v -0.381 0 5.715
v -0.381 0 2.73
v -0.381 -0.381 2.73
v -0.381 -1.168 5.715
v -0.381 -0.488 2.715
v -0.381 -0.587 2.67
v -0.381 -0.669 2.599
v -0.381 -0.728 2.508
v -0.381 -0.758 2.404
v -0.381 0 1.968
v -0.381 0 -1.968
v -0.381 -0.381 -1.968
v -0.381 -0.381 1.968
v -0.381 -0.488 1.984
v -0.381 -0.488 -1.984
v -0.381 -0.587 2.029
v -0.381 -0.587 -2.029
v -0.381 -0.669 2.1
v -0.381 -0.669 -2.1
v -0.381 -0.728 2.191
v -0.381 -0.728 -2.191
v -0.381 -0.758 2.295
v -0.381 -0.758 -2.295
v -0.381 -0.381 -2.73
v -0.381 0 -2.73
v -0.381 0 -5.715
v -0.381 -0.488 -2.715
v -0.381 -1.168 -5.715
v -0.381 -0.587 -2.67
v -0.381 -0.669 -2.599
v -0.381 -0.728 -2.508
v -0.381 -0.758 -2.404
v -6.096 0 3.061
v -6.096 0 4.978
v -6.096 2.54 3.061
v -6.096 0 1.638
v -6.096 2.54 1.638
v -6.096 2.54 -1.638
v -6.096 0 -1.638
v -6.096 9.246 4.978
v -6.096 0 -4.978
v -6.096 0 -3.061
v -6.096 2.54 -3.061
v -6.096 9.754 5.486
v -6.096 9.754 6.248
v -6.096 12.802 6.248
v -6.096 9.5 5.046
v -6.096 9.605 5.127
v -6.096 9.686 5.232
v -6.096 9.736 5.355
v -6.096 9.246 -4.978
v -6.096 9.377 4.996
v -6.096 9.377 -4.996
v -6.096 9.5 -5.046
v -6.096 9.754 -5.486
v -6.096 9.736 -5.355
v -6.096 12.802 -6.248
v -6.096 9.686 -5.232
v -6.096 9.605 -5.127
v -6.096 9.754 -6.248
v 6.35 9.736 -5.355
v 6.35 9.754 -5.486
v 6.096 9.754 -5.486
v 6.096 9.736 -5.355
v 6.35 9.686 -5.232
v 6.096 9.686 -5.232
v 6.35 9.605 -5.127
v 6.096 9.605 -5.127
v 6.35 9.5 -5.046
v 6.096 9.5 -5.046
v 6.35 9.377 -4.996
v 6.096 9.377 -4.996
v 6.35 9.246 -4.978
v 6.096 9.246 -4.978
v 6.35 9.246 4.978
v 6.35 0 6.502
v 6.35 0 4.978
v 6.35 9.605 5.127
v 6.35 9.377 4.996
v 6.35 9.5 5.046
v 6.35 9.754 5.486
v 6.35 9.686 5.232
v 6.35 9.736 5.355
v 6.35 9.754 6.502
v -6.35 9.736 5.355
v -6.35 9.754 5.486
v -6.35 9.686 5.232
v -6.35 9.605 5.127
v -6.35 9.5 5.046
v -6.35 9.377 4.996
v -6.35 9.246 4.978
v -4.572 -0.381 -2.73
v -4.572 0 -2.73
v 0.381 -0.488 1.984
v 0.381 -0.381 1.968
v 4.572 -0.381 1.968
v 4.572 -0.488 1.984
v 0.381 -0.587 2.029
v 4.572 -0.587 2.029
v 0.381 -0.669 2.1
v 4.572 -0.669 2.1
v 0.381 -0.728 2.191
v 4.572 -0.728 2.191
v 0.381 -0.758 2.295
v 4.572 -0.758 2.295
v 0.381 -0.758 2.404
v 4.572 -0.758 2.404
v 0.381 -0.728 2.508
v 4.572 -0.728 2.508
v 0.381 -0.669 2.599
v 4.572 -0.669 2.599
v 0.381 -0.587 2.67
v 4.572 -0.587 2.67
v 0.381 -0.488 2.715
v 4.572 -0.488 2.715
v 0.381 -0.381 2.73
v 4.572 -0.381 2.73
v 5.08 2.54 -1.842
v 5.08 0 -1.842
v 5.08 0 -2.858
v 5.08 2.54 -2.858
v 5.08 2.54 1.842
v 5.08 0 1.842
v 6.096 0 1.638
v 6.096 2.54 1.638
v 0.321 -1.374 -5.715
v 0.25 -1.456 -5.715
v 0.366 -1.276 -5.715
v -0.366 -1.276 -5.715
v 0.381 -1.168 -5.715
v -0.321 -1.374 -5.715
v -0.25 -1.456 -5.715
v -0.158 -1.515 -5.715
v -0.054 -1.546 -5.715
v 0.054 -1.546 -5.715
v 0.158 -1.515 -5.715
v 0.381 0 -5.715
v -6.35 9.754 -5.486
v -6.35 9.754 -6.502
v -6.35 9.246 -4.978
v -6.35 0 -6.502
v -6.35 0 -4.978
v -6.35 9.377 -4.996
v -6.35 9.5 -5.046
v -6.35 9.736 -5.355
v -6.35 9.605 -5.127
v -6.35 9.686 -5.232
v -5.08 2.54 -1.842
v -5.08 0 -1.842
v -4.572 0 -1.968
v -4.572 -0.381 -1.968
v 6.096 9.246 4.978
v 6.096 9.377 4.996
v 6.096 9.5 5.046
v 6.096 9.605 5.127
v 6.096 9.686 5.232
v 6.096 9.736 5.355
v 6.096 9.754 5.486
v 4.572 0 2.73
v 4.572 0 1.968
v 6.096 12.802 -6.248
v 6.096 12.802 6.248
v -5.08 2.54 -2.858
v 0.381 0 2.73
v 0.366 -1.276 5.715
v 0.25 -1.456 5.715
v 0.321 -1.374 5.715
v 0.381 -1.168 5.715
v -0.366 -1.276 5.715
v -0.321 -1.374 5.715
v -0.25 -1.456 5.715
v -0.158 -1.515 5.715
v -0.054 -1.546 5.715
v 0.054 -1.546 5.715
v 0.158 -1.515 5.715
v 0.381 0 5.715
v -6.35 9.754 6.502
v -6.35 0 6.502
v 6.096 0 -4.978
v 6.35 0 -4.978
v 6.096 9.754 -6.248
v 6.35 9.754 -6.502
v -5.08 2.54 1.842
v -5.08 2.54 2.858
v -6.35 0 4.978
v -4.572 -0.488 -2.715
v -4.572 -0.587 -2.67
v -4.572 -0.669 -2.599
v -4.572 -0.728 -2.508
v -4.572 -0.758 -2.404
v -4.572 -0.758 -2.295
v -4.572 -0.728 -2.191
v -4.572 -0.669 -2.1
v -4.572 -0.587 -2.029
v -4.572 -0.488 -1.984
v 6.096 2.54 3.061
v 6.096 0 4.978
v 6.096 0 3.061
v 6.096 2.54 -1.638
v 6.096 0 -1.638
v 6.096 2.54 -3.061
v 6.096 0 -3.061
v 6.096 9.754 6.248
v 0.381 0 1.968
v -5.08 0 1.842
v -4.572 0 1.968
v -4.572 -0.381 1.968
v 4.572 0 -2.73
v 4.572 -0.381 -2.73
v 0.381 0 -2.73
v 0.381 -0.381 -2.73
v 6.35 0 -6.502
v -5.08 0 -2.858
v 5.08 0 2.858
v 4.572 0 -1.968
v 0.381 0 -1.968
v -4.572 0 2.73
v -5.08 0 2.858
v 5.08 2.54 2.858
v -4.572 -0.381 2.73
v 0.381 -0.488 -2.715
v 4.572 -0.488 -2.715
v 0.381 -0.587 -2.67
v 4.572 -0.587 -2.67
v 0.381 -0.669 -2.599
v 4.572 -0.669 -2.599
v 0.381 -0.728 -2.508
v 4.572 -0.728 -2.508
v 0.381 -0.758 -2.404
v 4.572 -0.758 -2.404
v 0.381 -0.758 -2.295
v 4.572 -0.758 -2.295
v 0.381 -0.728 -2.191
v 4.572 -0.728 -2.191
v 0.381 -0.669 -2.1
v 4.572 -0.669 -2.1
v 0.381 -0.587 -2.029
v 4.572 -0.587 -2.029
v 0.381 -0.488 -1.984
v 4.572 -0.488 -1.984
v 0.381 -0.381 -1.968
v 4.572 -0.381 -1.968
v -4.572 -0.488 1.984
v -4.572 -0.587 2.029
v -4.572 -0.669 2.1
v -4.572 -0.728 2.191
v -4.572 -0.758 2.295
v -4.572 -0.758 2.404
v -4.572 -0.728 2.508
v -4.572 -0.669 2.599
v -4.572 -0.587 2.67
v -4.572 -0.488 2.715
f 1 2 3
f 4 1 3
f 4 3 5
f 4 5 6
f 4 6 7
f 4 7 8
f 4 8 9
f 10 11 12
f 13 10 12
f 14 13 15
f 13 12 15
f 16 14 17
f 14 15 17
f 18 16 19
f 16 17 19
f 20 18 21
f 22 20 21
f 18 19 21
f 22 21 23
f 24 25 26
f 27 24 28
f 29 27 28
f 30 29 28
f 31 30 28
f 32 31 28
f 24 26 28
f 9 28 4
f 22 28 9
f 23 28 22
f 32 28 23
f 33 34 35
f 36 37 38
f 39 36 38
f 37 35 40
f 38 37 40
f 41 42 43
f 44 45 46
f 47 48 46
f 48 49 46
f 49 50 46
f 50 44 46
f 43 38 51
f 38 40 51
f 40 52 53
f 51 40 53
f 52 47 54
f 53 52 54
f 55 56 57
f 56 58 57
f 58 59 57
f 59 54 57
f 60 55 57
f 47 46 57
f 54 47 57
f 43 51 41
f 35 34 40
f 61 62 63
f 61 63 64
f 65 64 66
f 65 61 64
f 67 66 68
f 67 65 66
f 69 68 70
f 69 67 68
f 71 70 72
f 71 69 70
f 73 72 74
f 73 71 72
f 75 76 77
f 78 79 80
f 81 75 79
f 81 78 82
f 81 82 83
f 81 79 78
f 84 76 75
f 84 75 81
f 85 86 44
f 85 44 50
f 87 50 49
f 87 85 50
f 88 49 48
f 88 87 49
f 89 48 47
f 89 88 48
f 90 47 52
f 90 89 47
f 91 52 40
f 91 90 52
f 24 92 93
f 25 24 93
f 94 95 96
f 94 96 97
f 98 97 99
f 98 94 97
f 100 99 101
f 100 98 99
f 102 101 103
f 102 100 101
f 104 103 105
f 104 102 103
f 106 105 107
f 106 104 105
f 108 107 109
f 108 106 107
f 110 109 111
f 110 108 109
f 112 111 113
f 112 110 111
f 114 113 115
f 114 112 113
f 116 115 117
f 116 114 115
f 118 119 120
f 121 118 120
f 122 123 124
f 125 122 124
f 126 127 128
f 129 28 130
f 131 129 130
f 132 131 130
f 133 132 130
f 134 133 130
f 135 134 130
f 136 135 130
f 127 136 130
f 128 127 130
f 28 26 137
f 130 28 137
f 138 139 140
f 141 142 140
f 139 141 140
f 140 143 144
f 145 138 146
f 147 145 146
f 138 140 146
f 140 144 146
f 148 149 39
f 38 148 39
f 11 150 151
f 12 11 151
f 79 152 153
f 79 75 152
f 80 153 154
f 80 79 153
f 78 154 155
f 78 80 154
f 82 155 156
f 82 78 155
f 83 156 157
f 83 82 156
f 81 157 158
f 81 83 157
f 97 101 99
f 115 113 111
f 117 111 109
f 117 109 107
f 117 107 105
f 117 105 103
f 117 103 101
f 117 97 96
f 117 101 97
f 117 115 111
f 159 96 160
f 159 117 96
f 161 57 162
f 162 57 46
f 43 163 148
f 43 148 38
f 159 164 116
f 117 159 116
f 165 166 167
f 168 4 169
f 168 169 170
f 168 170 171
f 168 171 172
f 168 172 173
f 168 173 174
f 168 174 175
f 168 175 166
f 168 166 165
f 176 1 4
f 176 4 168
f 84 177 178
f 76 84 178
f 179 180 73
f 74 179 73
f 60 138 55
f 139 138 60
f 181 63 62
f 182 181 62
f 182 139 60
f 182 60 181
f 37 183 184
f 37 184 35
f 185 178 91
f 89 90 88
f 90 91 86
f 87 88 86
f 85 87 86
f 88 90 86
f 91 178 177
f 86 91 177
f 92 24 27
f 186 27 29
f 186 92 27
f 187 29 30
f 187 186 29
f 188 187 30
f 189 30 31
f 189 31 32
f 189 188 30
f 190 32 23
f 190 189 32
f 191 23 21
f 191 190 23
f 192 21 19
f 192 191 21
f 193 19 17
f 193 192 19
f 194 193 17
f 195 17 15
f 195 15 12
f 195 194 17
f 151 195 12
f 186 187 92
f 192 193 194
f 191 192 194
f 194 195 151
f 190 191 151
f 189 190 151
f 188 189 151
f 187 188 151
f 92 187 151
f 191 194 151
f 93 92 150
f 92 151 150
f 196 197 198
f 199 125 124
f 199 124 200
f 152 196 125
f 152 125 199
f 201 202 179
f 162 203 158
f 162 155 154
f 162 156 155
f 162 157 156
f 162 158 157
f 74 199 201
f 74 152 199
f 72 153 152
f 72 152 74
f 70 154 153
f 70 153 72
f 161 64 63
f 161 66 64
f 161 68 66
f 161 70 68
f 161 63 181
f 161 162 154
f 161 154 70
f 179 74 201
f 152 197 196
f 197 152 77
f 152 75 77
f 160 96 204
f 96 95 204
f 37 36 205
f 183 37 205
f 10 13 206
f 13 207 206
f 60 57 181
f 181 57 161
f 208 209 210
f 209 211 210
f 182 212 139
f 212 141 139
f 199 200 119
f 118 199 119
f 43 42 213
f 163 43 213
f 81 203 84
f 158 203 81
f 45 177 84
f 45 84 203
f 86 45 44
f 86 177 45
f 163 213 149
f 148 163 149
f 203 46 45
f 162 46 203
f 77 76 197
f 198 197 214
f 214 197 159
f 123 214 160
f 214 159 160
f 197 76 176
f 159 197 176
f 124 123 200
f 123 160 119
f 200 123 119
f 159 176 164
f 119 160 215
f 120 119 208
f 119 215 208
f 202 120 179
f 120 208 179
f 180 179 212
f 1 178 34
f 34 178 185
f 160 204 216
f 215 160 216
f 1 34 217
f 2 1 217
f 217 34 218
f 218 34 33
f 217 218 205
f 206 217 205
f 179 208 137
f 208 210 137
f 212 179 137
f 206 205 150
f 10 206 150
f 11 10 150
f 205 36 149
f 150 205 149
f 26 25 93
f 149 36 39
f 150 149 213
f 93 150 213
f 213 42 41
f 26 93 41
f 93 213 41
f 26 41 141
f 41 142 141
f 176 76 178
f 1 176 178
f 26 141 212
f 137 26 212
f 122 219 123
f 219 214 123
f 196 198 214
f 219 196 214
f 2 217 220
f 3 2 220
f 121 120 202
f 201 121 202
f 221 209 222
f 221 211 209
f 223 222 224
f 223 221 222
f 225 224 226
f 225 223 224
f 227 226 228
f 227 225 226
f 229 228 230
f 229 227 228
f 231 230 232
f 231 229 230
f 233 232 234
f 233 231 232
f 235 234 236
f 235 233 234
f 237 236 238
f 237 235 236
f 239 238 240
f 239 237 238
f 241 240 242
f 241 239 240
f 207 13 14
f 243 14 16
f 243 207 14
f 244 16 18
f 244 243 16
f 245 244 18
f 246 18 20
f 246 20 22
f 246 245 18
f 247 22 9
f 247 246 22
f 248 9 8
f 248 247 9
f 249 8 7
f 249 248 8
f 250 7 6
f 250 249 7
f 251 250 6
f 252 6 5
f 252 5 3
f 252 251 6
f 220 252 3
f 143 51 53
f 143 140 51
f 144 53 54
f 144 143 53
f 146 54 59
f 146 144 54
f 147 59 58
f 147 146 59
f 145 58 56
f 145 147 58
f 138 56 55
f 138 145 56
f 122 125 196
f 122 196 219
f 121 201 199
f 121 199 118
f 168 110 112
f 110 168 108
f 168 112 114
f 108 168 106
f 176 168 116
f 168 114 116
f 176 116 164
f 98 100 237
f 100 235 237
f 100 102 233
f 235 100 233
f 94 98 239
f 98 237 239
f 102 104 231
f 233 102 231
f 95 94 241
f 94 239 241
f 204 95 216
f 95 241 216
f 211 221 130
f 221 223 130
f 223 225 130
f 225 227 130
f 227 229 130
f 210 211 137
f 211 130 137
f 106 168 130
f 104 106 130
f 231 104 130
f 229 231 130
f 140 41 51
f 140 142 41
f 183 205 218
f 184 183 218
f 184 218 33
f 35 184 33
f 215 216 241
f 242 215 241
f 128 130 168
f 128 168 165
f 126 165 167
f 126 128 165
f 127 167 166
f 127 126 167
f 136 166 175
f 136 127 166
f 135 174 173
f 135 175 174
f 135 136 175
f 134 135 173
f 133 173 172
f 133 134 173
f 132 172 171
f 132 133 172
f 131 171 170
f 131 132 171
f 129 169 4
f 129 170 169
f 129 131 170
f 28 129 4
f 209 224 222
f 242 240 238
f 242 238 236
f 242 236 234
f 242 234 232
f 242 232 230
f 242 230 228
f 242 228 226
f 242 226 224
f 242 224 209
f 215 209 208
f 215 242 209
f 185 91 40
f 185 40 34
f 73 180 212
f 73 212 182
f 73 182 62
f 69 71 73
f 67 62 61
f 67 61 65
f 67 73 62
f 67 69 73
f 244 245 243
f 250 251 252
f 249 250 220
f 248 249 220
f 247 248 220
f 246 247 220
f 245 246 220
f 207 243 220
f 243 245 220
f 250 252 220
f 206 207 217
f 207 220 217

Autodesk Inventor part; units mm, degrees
sketch "Sketch_1" plane through (0, 0, 0) normal (1, 0, 0) x (0, 1, 0)
  line L0 (12.8016, 6.5024) -> (0, 6.5024)
  line L1 (0, 6.5024) -> (0, -6.5024)
  line L2 (0, -6.5024) -> (12.8016, -6.5024)
  line L3 (12.8016, -6.5024) -> (12.8016, 6.5024)
extrude "Extrusion1" add sketch "Sketch_1" along normal mid plane 12.7
sketch "Sketch_5" plane through (6.35, 0, 0) normal (1, 0, 0) x (0, 0, -1)
  line L0 (-6.5024, 9.7536) -> (-5.4864, 9.7536)
  arc A0 (-4.9784, 9.2456) -> (-5.4864, 9.7536) centre (-5.4864, 9.2456) ccw
  line L1 (-4.9784, 9.2456) -> (-4.9784, 0)
  line L2 (-4.9784, 0) -> (4.9784, 0)
  line L3 (4.9784, 0) -> (4.9784, 9.2456)
  arc A1 (5.4864, 9.7536) -> (4.9784, 9.2456) centre (5.4864, 9.2456) ccw
  line L4 (5.4864, 9.7536) -> (6.5024, 9.7536)
  line L5 (6.5024, 9.7536) -> (6.5024, 13.0556)
  line L6 (6.5024, 13.0556) -> (-6.5024, 13.0556)
  line L7 (-6.5024, 13.0556) -> (-6.5024, 9.7536)
extrude "Extrusion2" cut sketch "Sketch_5" against normal blind 0.254
sketch "Sketch_6" plane through (-6.35, 0, 0) normal (1, 0, 0) x (0, 0, -1)
  line L0 (-6.5024, 9.7536) -> (-5.4864, 9.7536)
  arc A0 (-4.9784, 9.2456) -> (-5.4864, 9.7536) centre (-5.4864, 9.2456) ccw
  line L1 (-4.9784, 9.2456) -> (-4.9784, 0)
  line L2 (-4.9784, 0) -> (4.9784, 0)
  line L3 (4.9784, 0) -> (4.9784, 9.2456)
  arc A1 (5.4864, 9.7536) -> (4.9784, 9.2456) centre (5.4864, 9.2456) ccw
  line L4 (5.4864, 9.7536) -> (6.5024, 9.7536)
  line L5 (6.5024, 9.7536) -> (6.5024, 13.0556)
  line L6 (6.5024, 13.0556) -> (-6.5024, 13.0556)
  line L7 (-6.5024, 13.0556) -> (-6.5024, 9.7536)
extrude "Extrusion3" cut sketch "Sketch_6" along normal blind 0.254
sketch "Sketch_7" plane through (0, 0, -6.5024) normal (0, 0, 1) x (1, 0, 0)
  line L0 (-6.35, 9.7536) -> (6.35, 9.7536)
  line L1 (6.35, 9.7536) -> (6.35, 13.0556)
  line L2 (6.35, 13.0556) -> (-6.35, 13.0556)
  line L3 (-6.35, 13.0556) -> (-6.35, 9.7536)
extrude "Extrusion4" cut sketch "Sketch_7" along normal blind 0.254
sketch "Sketch_8" plane through (0, 0, 6.5024) normal (0, 0, 1) x (1, 0, 0)
  line L0 (-6.35, 9.7536) -> (6.35, 9.7536)
  line L1 (6.35, 9.7536) -> (6.35, 13.0556)
  line L2 (6.35, 13.0556) -> (-6.35, 13.0556)
  line L3 (-6.35, 13.0556) -> (-6.35, 9.7536)
extrude "Extrusion5" cut sketch "Sketch_8" against normal blind 0.254
sketch "Sketch_9" plane through (0, 0, 0) normal (0, 1, 0) x (-1, 0, 0)
  line L0 (8.128, 8.2804) -> (-8.128, 8.2804)
  line L1 (-8.128, 8.2804) -> (-8.128, -8.2804)
  line L2 (-8.128, -8.2804) -> (8.128, -8.2804)
  line L3 (8.128, -8.2804) -> (8.128, 8.2804)
  line L4 (6.35, -1.5875) -> (6.35, 1.5875)
  line L5 (6.35, 1.5875) -> (5.08, 1.8415)
  line L6 (5.08, 1.8415) -> (5.08, 2.8575)
  line L7 (5.08, 2.8575) -> (6.35, 3.1115)
  line L8 (6.35, 3.1115) -> (6.35, 6.5024)
  line L9 (6.35, 6.5024) -> (-6.35, 6.5024)
  line L10 (-6.35, 6.5024) -> (-6.35, 3.1115)
  line L11 (-6.35, 3.1115) -> (-5.08, 2.8575)
  line L12 (-5.08, 2.8575) -> (-5.08, 1.8415)
  line L13 (-5.08, 1.8415) -> (-6.35, 1.5875)
  line L14 (-6.35, 1.5875) -> (-6.35, -1.5875)
  line L15 (-6.35, -1.5875) -> (-5.08, -1.8415)
  line L16 (-5.08, -1.8415) -> (-5.08, -2.8575)
  line L17 (-5.08, -2.8575) -> (-6.35, -3.1115)
  line L18 (-6.35, -3.1115) -> (-6.35, -6.5024)
  line L19 (-6.35, -6.5024) -> (6.35, -6.5024)
  line L20 (6.35, -6.5024) -> (6.35, -3.1115)
  line L21 (6.35, -3.1115) -> (5.08, -2.8575)
  line L22 (5.08, -2.8575) -> (5.08, -1.8415)
  line L23 (5.08, -1.8415) -> (6.35, -1.5875)
extrude "Extrusion6" cut sketch "Sketch_9" along normal blind 2.54
sketch "Sketch_10" plane through (0, 0, 0) normal (0, 0, 1) x (1, 0, 0)
  line L0 (-0.381, 0) -> (-0.381, -1.1684)
  arc A0 (-0.381, -1.1684) -> (0.381, -1.1684) centre (0, -1.1684) ccw
  line L1 (0.381, -1.1684) -> (0.381, 0)
  line L2 (0.381, 0) -> (-0.381, 0)
extrude "Extrusion7" add sketch "Sketch_10" along normal mid plane 11.43
sketch "Sketch_11" plane through (0, 0, 0) normal (1, 0, 0) x (0, 1, 0)
  arc A0 (-0.381, 2.7305) -> (-0.381, 1.9685) centre (-0.381, 2.3495) ccw
  line L0 (-0.381, 1.9685) -> (0, 1.9685)
  line L1 (0, 1.9685) -> (0, -1.9685)
  line L2 (0, -1.9685) -> (-0.381, -1.9685)
  arc A1 (-0.381, -1.9685) -> (-0.381, -2.7305) centre (-0.381, -2.3495) ccw
  line L3 (-0.381, -2.7305) -> (0.508, -2.7305)
  line L4 (0.508, -2.7305) -> (0.508, 2.7305)
  line L5 (0.508, 2.7305) -> (-0.381, 2.7305)
extrude "Extrusion8" add sketch "Sketch_11" along normal mid plane 9.144
ref_plane "body_to_body_c_XY" through (0, 12.8016, 0) normal (0, -1, 0) x (1, 0, 0)
ref_plane "body_to_body_c_YZ" through (0, 12.8016, 0) normal (1, 0, 0) x (0, 0, 1)
ref_plane "body_to_body_c_ZX" through (0, 12.8016, 0) normal (0, 0, 1) x (0, -1, 0)
ref_plane "body_to_dummy_XY" through (0, 0, 0) normal (0, -1, 0) x (1, 0, 0)
ref_plane "body_to_dummy_YZ" through (0, 0, 0) normal (1, 0, 0) x (0, 0, 1)
ref_plane "body_to_dummy_ZX" through (0, 0, 0) normal (0, 0, 1) x (0, -1, 0)
ref_plane "body_to_terminal_XY" through (0, 0, 0) normal (0, -1, 0) x (1, 0, 0)
ref_plane "body_to_terminal_YZ" through (0, 0, 0) normal (1, 0, 0) x (0, 0, 1)
ref_plane "body_to_terminal_ZX" through (0, 0, 0) normal (0, 0, 1) x (0, -1, 0)
properties part number "M211LW01-body"
